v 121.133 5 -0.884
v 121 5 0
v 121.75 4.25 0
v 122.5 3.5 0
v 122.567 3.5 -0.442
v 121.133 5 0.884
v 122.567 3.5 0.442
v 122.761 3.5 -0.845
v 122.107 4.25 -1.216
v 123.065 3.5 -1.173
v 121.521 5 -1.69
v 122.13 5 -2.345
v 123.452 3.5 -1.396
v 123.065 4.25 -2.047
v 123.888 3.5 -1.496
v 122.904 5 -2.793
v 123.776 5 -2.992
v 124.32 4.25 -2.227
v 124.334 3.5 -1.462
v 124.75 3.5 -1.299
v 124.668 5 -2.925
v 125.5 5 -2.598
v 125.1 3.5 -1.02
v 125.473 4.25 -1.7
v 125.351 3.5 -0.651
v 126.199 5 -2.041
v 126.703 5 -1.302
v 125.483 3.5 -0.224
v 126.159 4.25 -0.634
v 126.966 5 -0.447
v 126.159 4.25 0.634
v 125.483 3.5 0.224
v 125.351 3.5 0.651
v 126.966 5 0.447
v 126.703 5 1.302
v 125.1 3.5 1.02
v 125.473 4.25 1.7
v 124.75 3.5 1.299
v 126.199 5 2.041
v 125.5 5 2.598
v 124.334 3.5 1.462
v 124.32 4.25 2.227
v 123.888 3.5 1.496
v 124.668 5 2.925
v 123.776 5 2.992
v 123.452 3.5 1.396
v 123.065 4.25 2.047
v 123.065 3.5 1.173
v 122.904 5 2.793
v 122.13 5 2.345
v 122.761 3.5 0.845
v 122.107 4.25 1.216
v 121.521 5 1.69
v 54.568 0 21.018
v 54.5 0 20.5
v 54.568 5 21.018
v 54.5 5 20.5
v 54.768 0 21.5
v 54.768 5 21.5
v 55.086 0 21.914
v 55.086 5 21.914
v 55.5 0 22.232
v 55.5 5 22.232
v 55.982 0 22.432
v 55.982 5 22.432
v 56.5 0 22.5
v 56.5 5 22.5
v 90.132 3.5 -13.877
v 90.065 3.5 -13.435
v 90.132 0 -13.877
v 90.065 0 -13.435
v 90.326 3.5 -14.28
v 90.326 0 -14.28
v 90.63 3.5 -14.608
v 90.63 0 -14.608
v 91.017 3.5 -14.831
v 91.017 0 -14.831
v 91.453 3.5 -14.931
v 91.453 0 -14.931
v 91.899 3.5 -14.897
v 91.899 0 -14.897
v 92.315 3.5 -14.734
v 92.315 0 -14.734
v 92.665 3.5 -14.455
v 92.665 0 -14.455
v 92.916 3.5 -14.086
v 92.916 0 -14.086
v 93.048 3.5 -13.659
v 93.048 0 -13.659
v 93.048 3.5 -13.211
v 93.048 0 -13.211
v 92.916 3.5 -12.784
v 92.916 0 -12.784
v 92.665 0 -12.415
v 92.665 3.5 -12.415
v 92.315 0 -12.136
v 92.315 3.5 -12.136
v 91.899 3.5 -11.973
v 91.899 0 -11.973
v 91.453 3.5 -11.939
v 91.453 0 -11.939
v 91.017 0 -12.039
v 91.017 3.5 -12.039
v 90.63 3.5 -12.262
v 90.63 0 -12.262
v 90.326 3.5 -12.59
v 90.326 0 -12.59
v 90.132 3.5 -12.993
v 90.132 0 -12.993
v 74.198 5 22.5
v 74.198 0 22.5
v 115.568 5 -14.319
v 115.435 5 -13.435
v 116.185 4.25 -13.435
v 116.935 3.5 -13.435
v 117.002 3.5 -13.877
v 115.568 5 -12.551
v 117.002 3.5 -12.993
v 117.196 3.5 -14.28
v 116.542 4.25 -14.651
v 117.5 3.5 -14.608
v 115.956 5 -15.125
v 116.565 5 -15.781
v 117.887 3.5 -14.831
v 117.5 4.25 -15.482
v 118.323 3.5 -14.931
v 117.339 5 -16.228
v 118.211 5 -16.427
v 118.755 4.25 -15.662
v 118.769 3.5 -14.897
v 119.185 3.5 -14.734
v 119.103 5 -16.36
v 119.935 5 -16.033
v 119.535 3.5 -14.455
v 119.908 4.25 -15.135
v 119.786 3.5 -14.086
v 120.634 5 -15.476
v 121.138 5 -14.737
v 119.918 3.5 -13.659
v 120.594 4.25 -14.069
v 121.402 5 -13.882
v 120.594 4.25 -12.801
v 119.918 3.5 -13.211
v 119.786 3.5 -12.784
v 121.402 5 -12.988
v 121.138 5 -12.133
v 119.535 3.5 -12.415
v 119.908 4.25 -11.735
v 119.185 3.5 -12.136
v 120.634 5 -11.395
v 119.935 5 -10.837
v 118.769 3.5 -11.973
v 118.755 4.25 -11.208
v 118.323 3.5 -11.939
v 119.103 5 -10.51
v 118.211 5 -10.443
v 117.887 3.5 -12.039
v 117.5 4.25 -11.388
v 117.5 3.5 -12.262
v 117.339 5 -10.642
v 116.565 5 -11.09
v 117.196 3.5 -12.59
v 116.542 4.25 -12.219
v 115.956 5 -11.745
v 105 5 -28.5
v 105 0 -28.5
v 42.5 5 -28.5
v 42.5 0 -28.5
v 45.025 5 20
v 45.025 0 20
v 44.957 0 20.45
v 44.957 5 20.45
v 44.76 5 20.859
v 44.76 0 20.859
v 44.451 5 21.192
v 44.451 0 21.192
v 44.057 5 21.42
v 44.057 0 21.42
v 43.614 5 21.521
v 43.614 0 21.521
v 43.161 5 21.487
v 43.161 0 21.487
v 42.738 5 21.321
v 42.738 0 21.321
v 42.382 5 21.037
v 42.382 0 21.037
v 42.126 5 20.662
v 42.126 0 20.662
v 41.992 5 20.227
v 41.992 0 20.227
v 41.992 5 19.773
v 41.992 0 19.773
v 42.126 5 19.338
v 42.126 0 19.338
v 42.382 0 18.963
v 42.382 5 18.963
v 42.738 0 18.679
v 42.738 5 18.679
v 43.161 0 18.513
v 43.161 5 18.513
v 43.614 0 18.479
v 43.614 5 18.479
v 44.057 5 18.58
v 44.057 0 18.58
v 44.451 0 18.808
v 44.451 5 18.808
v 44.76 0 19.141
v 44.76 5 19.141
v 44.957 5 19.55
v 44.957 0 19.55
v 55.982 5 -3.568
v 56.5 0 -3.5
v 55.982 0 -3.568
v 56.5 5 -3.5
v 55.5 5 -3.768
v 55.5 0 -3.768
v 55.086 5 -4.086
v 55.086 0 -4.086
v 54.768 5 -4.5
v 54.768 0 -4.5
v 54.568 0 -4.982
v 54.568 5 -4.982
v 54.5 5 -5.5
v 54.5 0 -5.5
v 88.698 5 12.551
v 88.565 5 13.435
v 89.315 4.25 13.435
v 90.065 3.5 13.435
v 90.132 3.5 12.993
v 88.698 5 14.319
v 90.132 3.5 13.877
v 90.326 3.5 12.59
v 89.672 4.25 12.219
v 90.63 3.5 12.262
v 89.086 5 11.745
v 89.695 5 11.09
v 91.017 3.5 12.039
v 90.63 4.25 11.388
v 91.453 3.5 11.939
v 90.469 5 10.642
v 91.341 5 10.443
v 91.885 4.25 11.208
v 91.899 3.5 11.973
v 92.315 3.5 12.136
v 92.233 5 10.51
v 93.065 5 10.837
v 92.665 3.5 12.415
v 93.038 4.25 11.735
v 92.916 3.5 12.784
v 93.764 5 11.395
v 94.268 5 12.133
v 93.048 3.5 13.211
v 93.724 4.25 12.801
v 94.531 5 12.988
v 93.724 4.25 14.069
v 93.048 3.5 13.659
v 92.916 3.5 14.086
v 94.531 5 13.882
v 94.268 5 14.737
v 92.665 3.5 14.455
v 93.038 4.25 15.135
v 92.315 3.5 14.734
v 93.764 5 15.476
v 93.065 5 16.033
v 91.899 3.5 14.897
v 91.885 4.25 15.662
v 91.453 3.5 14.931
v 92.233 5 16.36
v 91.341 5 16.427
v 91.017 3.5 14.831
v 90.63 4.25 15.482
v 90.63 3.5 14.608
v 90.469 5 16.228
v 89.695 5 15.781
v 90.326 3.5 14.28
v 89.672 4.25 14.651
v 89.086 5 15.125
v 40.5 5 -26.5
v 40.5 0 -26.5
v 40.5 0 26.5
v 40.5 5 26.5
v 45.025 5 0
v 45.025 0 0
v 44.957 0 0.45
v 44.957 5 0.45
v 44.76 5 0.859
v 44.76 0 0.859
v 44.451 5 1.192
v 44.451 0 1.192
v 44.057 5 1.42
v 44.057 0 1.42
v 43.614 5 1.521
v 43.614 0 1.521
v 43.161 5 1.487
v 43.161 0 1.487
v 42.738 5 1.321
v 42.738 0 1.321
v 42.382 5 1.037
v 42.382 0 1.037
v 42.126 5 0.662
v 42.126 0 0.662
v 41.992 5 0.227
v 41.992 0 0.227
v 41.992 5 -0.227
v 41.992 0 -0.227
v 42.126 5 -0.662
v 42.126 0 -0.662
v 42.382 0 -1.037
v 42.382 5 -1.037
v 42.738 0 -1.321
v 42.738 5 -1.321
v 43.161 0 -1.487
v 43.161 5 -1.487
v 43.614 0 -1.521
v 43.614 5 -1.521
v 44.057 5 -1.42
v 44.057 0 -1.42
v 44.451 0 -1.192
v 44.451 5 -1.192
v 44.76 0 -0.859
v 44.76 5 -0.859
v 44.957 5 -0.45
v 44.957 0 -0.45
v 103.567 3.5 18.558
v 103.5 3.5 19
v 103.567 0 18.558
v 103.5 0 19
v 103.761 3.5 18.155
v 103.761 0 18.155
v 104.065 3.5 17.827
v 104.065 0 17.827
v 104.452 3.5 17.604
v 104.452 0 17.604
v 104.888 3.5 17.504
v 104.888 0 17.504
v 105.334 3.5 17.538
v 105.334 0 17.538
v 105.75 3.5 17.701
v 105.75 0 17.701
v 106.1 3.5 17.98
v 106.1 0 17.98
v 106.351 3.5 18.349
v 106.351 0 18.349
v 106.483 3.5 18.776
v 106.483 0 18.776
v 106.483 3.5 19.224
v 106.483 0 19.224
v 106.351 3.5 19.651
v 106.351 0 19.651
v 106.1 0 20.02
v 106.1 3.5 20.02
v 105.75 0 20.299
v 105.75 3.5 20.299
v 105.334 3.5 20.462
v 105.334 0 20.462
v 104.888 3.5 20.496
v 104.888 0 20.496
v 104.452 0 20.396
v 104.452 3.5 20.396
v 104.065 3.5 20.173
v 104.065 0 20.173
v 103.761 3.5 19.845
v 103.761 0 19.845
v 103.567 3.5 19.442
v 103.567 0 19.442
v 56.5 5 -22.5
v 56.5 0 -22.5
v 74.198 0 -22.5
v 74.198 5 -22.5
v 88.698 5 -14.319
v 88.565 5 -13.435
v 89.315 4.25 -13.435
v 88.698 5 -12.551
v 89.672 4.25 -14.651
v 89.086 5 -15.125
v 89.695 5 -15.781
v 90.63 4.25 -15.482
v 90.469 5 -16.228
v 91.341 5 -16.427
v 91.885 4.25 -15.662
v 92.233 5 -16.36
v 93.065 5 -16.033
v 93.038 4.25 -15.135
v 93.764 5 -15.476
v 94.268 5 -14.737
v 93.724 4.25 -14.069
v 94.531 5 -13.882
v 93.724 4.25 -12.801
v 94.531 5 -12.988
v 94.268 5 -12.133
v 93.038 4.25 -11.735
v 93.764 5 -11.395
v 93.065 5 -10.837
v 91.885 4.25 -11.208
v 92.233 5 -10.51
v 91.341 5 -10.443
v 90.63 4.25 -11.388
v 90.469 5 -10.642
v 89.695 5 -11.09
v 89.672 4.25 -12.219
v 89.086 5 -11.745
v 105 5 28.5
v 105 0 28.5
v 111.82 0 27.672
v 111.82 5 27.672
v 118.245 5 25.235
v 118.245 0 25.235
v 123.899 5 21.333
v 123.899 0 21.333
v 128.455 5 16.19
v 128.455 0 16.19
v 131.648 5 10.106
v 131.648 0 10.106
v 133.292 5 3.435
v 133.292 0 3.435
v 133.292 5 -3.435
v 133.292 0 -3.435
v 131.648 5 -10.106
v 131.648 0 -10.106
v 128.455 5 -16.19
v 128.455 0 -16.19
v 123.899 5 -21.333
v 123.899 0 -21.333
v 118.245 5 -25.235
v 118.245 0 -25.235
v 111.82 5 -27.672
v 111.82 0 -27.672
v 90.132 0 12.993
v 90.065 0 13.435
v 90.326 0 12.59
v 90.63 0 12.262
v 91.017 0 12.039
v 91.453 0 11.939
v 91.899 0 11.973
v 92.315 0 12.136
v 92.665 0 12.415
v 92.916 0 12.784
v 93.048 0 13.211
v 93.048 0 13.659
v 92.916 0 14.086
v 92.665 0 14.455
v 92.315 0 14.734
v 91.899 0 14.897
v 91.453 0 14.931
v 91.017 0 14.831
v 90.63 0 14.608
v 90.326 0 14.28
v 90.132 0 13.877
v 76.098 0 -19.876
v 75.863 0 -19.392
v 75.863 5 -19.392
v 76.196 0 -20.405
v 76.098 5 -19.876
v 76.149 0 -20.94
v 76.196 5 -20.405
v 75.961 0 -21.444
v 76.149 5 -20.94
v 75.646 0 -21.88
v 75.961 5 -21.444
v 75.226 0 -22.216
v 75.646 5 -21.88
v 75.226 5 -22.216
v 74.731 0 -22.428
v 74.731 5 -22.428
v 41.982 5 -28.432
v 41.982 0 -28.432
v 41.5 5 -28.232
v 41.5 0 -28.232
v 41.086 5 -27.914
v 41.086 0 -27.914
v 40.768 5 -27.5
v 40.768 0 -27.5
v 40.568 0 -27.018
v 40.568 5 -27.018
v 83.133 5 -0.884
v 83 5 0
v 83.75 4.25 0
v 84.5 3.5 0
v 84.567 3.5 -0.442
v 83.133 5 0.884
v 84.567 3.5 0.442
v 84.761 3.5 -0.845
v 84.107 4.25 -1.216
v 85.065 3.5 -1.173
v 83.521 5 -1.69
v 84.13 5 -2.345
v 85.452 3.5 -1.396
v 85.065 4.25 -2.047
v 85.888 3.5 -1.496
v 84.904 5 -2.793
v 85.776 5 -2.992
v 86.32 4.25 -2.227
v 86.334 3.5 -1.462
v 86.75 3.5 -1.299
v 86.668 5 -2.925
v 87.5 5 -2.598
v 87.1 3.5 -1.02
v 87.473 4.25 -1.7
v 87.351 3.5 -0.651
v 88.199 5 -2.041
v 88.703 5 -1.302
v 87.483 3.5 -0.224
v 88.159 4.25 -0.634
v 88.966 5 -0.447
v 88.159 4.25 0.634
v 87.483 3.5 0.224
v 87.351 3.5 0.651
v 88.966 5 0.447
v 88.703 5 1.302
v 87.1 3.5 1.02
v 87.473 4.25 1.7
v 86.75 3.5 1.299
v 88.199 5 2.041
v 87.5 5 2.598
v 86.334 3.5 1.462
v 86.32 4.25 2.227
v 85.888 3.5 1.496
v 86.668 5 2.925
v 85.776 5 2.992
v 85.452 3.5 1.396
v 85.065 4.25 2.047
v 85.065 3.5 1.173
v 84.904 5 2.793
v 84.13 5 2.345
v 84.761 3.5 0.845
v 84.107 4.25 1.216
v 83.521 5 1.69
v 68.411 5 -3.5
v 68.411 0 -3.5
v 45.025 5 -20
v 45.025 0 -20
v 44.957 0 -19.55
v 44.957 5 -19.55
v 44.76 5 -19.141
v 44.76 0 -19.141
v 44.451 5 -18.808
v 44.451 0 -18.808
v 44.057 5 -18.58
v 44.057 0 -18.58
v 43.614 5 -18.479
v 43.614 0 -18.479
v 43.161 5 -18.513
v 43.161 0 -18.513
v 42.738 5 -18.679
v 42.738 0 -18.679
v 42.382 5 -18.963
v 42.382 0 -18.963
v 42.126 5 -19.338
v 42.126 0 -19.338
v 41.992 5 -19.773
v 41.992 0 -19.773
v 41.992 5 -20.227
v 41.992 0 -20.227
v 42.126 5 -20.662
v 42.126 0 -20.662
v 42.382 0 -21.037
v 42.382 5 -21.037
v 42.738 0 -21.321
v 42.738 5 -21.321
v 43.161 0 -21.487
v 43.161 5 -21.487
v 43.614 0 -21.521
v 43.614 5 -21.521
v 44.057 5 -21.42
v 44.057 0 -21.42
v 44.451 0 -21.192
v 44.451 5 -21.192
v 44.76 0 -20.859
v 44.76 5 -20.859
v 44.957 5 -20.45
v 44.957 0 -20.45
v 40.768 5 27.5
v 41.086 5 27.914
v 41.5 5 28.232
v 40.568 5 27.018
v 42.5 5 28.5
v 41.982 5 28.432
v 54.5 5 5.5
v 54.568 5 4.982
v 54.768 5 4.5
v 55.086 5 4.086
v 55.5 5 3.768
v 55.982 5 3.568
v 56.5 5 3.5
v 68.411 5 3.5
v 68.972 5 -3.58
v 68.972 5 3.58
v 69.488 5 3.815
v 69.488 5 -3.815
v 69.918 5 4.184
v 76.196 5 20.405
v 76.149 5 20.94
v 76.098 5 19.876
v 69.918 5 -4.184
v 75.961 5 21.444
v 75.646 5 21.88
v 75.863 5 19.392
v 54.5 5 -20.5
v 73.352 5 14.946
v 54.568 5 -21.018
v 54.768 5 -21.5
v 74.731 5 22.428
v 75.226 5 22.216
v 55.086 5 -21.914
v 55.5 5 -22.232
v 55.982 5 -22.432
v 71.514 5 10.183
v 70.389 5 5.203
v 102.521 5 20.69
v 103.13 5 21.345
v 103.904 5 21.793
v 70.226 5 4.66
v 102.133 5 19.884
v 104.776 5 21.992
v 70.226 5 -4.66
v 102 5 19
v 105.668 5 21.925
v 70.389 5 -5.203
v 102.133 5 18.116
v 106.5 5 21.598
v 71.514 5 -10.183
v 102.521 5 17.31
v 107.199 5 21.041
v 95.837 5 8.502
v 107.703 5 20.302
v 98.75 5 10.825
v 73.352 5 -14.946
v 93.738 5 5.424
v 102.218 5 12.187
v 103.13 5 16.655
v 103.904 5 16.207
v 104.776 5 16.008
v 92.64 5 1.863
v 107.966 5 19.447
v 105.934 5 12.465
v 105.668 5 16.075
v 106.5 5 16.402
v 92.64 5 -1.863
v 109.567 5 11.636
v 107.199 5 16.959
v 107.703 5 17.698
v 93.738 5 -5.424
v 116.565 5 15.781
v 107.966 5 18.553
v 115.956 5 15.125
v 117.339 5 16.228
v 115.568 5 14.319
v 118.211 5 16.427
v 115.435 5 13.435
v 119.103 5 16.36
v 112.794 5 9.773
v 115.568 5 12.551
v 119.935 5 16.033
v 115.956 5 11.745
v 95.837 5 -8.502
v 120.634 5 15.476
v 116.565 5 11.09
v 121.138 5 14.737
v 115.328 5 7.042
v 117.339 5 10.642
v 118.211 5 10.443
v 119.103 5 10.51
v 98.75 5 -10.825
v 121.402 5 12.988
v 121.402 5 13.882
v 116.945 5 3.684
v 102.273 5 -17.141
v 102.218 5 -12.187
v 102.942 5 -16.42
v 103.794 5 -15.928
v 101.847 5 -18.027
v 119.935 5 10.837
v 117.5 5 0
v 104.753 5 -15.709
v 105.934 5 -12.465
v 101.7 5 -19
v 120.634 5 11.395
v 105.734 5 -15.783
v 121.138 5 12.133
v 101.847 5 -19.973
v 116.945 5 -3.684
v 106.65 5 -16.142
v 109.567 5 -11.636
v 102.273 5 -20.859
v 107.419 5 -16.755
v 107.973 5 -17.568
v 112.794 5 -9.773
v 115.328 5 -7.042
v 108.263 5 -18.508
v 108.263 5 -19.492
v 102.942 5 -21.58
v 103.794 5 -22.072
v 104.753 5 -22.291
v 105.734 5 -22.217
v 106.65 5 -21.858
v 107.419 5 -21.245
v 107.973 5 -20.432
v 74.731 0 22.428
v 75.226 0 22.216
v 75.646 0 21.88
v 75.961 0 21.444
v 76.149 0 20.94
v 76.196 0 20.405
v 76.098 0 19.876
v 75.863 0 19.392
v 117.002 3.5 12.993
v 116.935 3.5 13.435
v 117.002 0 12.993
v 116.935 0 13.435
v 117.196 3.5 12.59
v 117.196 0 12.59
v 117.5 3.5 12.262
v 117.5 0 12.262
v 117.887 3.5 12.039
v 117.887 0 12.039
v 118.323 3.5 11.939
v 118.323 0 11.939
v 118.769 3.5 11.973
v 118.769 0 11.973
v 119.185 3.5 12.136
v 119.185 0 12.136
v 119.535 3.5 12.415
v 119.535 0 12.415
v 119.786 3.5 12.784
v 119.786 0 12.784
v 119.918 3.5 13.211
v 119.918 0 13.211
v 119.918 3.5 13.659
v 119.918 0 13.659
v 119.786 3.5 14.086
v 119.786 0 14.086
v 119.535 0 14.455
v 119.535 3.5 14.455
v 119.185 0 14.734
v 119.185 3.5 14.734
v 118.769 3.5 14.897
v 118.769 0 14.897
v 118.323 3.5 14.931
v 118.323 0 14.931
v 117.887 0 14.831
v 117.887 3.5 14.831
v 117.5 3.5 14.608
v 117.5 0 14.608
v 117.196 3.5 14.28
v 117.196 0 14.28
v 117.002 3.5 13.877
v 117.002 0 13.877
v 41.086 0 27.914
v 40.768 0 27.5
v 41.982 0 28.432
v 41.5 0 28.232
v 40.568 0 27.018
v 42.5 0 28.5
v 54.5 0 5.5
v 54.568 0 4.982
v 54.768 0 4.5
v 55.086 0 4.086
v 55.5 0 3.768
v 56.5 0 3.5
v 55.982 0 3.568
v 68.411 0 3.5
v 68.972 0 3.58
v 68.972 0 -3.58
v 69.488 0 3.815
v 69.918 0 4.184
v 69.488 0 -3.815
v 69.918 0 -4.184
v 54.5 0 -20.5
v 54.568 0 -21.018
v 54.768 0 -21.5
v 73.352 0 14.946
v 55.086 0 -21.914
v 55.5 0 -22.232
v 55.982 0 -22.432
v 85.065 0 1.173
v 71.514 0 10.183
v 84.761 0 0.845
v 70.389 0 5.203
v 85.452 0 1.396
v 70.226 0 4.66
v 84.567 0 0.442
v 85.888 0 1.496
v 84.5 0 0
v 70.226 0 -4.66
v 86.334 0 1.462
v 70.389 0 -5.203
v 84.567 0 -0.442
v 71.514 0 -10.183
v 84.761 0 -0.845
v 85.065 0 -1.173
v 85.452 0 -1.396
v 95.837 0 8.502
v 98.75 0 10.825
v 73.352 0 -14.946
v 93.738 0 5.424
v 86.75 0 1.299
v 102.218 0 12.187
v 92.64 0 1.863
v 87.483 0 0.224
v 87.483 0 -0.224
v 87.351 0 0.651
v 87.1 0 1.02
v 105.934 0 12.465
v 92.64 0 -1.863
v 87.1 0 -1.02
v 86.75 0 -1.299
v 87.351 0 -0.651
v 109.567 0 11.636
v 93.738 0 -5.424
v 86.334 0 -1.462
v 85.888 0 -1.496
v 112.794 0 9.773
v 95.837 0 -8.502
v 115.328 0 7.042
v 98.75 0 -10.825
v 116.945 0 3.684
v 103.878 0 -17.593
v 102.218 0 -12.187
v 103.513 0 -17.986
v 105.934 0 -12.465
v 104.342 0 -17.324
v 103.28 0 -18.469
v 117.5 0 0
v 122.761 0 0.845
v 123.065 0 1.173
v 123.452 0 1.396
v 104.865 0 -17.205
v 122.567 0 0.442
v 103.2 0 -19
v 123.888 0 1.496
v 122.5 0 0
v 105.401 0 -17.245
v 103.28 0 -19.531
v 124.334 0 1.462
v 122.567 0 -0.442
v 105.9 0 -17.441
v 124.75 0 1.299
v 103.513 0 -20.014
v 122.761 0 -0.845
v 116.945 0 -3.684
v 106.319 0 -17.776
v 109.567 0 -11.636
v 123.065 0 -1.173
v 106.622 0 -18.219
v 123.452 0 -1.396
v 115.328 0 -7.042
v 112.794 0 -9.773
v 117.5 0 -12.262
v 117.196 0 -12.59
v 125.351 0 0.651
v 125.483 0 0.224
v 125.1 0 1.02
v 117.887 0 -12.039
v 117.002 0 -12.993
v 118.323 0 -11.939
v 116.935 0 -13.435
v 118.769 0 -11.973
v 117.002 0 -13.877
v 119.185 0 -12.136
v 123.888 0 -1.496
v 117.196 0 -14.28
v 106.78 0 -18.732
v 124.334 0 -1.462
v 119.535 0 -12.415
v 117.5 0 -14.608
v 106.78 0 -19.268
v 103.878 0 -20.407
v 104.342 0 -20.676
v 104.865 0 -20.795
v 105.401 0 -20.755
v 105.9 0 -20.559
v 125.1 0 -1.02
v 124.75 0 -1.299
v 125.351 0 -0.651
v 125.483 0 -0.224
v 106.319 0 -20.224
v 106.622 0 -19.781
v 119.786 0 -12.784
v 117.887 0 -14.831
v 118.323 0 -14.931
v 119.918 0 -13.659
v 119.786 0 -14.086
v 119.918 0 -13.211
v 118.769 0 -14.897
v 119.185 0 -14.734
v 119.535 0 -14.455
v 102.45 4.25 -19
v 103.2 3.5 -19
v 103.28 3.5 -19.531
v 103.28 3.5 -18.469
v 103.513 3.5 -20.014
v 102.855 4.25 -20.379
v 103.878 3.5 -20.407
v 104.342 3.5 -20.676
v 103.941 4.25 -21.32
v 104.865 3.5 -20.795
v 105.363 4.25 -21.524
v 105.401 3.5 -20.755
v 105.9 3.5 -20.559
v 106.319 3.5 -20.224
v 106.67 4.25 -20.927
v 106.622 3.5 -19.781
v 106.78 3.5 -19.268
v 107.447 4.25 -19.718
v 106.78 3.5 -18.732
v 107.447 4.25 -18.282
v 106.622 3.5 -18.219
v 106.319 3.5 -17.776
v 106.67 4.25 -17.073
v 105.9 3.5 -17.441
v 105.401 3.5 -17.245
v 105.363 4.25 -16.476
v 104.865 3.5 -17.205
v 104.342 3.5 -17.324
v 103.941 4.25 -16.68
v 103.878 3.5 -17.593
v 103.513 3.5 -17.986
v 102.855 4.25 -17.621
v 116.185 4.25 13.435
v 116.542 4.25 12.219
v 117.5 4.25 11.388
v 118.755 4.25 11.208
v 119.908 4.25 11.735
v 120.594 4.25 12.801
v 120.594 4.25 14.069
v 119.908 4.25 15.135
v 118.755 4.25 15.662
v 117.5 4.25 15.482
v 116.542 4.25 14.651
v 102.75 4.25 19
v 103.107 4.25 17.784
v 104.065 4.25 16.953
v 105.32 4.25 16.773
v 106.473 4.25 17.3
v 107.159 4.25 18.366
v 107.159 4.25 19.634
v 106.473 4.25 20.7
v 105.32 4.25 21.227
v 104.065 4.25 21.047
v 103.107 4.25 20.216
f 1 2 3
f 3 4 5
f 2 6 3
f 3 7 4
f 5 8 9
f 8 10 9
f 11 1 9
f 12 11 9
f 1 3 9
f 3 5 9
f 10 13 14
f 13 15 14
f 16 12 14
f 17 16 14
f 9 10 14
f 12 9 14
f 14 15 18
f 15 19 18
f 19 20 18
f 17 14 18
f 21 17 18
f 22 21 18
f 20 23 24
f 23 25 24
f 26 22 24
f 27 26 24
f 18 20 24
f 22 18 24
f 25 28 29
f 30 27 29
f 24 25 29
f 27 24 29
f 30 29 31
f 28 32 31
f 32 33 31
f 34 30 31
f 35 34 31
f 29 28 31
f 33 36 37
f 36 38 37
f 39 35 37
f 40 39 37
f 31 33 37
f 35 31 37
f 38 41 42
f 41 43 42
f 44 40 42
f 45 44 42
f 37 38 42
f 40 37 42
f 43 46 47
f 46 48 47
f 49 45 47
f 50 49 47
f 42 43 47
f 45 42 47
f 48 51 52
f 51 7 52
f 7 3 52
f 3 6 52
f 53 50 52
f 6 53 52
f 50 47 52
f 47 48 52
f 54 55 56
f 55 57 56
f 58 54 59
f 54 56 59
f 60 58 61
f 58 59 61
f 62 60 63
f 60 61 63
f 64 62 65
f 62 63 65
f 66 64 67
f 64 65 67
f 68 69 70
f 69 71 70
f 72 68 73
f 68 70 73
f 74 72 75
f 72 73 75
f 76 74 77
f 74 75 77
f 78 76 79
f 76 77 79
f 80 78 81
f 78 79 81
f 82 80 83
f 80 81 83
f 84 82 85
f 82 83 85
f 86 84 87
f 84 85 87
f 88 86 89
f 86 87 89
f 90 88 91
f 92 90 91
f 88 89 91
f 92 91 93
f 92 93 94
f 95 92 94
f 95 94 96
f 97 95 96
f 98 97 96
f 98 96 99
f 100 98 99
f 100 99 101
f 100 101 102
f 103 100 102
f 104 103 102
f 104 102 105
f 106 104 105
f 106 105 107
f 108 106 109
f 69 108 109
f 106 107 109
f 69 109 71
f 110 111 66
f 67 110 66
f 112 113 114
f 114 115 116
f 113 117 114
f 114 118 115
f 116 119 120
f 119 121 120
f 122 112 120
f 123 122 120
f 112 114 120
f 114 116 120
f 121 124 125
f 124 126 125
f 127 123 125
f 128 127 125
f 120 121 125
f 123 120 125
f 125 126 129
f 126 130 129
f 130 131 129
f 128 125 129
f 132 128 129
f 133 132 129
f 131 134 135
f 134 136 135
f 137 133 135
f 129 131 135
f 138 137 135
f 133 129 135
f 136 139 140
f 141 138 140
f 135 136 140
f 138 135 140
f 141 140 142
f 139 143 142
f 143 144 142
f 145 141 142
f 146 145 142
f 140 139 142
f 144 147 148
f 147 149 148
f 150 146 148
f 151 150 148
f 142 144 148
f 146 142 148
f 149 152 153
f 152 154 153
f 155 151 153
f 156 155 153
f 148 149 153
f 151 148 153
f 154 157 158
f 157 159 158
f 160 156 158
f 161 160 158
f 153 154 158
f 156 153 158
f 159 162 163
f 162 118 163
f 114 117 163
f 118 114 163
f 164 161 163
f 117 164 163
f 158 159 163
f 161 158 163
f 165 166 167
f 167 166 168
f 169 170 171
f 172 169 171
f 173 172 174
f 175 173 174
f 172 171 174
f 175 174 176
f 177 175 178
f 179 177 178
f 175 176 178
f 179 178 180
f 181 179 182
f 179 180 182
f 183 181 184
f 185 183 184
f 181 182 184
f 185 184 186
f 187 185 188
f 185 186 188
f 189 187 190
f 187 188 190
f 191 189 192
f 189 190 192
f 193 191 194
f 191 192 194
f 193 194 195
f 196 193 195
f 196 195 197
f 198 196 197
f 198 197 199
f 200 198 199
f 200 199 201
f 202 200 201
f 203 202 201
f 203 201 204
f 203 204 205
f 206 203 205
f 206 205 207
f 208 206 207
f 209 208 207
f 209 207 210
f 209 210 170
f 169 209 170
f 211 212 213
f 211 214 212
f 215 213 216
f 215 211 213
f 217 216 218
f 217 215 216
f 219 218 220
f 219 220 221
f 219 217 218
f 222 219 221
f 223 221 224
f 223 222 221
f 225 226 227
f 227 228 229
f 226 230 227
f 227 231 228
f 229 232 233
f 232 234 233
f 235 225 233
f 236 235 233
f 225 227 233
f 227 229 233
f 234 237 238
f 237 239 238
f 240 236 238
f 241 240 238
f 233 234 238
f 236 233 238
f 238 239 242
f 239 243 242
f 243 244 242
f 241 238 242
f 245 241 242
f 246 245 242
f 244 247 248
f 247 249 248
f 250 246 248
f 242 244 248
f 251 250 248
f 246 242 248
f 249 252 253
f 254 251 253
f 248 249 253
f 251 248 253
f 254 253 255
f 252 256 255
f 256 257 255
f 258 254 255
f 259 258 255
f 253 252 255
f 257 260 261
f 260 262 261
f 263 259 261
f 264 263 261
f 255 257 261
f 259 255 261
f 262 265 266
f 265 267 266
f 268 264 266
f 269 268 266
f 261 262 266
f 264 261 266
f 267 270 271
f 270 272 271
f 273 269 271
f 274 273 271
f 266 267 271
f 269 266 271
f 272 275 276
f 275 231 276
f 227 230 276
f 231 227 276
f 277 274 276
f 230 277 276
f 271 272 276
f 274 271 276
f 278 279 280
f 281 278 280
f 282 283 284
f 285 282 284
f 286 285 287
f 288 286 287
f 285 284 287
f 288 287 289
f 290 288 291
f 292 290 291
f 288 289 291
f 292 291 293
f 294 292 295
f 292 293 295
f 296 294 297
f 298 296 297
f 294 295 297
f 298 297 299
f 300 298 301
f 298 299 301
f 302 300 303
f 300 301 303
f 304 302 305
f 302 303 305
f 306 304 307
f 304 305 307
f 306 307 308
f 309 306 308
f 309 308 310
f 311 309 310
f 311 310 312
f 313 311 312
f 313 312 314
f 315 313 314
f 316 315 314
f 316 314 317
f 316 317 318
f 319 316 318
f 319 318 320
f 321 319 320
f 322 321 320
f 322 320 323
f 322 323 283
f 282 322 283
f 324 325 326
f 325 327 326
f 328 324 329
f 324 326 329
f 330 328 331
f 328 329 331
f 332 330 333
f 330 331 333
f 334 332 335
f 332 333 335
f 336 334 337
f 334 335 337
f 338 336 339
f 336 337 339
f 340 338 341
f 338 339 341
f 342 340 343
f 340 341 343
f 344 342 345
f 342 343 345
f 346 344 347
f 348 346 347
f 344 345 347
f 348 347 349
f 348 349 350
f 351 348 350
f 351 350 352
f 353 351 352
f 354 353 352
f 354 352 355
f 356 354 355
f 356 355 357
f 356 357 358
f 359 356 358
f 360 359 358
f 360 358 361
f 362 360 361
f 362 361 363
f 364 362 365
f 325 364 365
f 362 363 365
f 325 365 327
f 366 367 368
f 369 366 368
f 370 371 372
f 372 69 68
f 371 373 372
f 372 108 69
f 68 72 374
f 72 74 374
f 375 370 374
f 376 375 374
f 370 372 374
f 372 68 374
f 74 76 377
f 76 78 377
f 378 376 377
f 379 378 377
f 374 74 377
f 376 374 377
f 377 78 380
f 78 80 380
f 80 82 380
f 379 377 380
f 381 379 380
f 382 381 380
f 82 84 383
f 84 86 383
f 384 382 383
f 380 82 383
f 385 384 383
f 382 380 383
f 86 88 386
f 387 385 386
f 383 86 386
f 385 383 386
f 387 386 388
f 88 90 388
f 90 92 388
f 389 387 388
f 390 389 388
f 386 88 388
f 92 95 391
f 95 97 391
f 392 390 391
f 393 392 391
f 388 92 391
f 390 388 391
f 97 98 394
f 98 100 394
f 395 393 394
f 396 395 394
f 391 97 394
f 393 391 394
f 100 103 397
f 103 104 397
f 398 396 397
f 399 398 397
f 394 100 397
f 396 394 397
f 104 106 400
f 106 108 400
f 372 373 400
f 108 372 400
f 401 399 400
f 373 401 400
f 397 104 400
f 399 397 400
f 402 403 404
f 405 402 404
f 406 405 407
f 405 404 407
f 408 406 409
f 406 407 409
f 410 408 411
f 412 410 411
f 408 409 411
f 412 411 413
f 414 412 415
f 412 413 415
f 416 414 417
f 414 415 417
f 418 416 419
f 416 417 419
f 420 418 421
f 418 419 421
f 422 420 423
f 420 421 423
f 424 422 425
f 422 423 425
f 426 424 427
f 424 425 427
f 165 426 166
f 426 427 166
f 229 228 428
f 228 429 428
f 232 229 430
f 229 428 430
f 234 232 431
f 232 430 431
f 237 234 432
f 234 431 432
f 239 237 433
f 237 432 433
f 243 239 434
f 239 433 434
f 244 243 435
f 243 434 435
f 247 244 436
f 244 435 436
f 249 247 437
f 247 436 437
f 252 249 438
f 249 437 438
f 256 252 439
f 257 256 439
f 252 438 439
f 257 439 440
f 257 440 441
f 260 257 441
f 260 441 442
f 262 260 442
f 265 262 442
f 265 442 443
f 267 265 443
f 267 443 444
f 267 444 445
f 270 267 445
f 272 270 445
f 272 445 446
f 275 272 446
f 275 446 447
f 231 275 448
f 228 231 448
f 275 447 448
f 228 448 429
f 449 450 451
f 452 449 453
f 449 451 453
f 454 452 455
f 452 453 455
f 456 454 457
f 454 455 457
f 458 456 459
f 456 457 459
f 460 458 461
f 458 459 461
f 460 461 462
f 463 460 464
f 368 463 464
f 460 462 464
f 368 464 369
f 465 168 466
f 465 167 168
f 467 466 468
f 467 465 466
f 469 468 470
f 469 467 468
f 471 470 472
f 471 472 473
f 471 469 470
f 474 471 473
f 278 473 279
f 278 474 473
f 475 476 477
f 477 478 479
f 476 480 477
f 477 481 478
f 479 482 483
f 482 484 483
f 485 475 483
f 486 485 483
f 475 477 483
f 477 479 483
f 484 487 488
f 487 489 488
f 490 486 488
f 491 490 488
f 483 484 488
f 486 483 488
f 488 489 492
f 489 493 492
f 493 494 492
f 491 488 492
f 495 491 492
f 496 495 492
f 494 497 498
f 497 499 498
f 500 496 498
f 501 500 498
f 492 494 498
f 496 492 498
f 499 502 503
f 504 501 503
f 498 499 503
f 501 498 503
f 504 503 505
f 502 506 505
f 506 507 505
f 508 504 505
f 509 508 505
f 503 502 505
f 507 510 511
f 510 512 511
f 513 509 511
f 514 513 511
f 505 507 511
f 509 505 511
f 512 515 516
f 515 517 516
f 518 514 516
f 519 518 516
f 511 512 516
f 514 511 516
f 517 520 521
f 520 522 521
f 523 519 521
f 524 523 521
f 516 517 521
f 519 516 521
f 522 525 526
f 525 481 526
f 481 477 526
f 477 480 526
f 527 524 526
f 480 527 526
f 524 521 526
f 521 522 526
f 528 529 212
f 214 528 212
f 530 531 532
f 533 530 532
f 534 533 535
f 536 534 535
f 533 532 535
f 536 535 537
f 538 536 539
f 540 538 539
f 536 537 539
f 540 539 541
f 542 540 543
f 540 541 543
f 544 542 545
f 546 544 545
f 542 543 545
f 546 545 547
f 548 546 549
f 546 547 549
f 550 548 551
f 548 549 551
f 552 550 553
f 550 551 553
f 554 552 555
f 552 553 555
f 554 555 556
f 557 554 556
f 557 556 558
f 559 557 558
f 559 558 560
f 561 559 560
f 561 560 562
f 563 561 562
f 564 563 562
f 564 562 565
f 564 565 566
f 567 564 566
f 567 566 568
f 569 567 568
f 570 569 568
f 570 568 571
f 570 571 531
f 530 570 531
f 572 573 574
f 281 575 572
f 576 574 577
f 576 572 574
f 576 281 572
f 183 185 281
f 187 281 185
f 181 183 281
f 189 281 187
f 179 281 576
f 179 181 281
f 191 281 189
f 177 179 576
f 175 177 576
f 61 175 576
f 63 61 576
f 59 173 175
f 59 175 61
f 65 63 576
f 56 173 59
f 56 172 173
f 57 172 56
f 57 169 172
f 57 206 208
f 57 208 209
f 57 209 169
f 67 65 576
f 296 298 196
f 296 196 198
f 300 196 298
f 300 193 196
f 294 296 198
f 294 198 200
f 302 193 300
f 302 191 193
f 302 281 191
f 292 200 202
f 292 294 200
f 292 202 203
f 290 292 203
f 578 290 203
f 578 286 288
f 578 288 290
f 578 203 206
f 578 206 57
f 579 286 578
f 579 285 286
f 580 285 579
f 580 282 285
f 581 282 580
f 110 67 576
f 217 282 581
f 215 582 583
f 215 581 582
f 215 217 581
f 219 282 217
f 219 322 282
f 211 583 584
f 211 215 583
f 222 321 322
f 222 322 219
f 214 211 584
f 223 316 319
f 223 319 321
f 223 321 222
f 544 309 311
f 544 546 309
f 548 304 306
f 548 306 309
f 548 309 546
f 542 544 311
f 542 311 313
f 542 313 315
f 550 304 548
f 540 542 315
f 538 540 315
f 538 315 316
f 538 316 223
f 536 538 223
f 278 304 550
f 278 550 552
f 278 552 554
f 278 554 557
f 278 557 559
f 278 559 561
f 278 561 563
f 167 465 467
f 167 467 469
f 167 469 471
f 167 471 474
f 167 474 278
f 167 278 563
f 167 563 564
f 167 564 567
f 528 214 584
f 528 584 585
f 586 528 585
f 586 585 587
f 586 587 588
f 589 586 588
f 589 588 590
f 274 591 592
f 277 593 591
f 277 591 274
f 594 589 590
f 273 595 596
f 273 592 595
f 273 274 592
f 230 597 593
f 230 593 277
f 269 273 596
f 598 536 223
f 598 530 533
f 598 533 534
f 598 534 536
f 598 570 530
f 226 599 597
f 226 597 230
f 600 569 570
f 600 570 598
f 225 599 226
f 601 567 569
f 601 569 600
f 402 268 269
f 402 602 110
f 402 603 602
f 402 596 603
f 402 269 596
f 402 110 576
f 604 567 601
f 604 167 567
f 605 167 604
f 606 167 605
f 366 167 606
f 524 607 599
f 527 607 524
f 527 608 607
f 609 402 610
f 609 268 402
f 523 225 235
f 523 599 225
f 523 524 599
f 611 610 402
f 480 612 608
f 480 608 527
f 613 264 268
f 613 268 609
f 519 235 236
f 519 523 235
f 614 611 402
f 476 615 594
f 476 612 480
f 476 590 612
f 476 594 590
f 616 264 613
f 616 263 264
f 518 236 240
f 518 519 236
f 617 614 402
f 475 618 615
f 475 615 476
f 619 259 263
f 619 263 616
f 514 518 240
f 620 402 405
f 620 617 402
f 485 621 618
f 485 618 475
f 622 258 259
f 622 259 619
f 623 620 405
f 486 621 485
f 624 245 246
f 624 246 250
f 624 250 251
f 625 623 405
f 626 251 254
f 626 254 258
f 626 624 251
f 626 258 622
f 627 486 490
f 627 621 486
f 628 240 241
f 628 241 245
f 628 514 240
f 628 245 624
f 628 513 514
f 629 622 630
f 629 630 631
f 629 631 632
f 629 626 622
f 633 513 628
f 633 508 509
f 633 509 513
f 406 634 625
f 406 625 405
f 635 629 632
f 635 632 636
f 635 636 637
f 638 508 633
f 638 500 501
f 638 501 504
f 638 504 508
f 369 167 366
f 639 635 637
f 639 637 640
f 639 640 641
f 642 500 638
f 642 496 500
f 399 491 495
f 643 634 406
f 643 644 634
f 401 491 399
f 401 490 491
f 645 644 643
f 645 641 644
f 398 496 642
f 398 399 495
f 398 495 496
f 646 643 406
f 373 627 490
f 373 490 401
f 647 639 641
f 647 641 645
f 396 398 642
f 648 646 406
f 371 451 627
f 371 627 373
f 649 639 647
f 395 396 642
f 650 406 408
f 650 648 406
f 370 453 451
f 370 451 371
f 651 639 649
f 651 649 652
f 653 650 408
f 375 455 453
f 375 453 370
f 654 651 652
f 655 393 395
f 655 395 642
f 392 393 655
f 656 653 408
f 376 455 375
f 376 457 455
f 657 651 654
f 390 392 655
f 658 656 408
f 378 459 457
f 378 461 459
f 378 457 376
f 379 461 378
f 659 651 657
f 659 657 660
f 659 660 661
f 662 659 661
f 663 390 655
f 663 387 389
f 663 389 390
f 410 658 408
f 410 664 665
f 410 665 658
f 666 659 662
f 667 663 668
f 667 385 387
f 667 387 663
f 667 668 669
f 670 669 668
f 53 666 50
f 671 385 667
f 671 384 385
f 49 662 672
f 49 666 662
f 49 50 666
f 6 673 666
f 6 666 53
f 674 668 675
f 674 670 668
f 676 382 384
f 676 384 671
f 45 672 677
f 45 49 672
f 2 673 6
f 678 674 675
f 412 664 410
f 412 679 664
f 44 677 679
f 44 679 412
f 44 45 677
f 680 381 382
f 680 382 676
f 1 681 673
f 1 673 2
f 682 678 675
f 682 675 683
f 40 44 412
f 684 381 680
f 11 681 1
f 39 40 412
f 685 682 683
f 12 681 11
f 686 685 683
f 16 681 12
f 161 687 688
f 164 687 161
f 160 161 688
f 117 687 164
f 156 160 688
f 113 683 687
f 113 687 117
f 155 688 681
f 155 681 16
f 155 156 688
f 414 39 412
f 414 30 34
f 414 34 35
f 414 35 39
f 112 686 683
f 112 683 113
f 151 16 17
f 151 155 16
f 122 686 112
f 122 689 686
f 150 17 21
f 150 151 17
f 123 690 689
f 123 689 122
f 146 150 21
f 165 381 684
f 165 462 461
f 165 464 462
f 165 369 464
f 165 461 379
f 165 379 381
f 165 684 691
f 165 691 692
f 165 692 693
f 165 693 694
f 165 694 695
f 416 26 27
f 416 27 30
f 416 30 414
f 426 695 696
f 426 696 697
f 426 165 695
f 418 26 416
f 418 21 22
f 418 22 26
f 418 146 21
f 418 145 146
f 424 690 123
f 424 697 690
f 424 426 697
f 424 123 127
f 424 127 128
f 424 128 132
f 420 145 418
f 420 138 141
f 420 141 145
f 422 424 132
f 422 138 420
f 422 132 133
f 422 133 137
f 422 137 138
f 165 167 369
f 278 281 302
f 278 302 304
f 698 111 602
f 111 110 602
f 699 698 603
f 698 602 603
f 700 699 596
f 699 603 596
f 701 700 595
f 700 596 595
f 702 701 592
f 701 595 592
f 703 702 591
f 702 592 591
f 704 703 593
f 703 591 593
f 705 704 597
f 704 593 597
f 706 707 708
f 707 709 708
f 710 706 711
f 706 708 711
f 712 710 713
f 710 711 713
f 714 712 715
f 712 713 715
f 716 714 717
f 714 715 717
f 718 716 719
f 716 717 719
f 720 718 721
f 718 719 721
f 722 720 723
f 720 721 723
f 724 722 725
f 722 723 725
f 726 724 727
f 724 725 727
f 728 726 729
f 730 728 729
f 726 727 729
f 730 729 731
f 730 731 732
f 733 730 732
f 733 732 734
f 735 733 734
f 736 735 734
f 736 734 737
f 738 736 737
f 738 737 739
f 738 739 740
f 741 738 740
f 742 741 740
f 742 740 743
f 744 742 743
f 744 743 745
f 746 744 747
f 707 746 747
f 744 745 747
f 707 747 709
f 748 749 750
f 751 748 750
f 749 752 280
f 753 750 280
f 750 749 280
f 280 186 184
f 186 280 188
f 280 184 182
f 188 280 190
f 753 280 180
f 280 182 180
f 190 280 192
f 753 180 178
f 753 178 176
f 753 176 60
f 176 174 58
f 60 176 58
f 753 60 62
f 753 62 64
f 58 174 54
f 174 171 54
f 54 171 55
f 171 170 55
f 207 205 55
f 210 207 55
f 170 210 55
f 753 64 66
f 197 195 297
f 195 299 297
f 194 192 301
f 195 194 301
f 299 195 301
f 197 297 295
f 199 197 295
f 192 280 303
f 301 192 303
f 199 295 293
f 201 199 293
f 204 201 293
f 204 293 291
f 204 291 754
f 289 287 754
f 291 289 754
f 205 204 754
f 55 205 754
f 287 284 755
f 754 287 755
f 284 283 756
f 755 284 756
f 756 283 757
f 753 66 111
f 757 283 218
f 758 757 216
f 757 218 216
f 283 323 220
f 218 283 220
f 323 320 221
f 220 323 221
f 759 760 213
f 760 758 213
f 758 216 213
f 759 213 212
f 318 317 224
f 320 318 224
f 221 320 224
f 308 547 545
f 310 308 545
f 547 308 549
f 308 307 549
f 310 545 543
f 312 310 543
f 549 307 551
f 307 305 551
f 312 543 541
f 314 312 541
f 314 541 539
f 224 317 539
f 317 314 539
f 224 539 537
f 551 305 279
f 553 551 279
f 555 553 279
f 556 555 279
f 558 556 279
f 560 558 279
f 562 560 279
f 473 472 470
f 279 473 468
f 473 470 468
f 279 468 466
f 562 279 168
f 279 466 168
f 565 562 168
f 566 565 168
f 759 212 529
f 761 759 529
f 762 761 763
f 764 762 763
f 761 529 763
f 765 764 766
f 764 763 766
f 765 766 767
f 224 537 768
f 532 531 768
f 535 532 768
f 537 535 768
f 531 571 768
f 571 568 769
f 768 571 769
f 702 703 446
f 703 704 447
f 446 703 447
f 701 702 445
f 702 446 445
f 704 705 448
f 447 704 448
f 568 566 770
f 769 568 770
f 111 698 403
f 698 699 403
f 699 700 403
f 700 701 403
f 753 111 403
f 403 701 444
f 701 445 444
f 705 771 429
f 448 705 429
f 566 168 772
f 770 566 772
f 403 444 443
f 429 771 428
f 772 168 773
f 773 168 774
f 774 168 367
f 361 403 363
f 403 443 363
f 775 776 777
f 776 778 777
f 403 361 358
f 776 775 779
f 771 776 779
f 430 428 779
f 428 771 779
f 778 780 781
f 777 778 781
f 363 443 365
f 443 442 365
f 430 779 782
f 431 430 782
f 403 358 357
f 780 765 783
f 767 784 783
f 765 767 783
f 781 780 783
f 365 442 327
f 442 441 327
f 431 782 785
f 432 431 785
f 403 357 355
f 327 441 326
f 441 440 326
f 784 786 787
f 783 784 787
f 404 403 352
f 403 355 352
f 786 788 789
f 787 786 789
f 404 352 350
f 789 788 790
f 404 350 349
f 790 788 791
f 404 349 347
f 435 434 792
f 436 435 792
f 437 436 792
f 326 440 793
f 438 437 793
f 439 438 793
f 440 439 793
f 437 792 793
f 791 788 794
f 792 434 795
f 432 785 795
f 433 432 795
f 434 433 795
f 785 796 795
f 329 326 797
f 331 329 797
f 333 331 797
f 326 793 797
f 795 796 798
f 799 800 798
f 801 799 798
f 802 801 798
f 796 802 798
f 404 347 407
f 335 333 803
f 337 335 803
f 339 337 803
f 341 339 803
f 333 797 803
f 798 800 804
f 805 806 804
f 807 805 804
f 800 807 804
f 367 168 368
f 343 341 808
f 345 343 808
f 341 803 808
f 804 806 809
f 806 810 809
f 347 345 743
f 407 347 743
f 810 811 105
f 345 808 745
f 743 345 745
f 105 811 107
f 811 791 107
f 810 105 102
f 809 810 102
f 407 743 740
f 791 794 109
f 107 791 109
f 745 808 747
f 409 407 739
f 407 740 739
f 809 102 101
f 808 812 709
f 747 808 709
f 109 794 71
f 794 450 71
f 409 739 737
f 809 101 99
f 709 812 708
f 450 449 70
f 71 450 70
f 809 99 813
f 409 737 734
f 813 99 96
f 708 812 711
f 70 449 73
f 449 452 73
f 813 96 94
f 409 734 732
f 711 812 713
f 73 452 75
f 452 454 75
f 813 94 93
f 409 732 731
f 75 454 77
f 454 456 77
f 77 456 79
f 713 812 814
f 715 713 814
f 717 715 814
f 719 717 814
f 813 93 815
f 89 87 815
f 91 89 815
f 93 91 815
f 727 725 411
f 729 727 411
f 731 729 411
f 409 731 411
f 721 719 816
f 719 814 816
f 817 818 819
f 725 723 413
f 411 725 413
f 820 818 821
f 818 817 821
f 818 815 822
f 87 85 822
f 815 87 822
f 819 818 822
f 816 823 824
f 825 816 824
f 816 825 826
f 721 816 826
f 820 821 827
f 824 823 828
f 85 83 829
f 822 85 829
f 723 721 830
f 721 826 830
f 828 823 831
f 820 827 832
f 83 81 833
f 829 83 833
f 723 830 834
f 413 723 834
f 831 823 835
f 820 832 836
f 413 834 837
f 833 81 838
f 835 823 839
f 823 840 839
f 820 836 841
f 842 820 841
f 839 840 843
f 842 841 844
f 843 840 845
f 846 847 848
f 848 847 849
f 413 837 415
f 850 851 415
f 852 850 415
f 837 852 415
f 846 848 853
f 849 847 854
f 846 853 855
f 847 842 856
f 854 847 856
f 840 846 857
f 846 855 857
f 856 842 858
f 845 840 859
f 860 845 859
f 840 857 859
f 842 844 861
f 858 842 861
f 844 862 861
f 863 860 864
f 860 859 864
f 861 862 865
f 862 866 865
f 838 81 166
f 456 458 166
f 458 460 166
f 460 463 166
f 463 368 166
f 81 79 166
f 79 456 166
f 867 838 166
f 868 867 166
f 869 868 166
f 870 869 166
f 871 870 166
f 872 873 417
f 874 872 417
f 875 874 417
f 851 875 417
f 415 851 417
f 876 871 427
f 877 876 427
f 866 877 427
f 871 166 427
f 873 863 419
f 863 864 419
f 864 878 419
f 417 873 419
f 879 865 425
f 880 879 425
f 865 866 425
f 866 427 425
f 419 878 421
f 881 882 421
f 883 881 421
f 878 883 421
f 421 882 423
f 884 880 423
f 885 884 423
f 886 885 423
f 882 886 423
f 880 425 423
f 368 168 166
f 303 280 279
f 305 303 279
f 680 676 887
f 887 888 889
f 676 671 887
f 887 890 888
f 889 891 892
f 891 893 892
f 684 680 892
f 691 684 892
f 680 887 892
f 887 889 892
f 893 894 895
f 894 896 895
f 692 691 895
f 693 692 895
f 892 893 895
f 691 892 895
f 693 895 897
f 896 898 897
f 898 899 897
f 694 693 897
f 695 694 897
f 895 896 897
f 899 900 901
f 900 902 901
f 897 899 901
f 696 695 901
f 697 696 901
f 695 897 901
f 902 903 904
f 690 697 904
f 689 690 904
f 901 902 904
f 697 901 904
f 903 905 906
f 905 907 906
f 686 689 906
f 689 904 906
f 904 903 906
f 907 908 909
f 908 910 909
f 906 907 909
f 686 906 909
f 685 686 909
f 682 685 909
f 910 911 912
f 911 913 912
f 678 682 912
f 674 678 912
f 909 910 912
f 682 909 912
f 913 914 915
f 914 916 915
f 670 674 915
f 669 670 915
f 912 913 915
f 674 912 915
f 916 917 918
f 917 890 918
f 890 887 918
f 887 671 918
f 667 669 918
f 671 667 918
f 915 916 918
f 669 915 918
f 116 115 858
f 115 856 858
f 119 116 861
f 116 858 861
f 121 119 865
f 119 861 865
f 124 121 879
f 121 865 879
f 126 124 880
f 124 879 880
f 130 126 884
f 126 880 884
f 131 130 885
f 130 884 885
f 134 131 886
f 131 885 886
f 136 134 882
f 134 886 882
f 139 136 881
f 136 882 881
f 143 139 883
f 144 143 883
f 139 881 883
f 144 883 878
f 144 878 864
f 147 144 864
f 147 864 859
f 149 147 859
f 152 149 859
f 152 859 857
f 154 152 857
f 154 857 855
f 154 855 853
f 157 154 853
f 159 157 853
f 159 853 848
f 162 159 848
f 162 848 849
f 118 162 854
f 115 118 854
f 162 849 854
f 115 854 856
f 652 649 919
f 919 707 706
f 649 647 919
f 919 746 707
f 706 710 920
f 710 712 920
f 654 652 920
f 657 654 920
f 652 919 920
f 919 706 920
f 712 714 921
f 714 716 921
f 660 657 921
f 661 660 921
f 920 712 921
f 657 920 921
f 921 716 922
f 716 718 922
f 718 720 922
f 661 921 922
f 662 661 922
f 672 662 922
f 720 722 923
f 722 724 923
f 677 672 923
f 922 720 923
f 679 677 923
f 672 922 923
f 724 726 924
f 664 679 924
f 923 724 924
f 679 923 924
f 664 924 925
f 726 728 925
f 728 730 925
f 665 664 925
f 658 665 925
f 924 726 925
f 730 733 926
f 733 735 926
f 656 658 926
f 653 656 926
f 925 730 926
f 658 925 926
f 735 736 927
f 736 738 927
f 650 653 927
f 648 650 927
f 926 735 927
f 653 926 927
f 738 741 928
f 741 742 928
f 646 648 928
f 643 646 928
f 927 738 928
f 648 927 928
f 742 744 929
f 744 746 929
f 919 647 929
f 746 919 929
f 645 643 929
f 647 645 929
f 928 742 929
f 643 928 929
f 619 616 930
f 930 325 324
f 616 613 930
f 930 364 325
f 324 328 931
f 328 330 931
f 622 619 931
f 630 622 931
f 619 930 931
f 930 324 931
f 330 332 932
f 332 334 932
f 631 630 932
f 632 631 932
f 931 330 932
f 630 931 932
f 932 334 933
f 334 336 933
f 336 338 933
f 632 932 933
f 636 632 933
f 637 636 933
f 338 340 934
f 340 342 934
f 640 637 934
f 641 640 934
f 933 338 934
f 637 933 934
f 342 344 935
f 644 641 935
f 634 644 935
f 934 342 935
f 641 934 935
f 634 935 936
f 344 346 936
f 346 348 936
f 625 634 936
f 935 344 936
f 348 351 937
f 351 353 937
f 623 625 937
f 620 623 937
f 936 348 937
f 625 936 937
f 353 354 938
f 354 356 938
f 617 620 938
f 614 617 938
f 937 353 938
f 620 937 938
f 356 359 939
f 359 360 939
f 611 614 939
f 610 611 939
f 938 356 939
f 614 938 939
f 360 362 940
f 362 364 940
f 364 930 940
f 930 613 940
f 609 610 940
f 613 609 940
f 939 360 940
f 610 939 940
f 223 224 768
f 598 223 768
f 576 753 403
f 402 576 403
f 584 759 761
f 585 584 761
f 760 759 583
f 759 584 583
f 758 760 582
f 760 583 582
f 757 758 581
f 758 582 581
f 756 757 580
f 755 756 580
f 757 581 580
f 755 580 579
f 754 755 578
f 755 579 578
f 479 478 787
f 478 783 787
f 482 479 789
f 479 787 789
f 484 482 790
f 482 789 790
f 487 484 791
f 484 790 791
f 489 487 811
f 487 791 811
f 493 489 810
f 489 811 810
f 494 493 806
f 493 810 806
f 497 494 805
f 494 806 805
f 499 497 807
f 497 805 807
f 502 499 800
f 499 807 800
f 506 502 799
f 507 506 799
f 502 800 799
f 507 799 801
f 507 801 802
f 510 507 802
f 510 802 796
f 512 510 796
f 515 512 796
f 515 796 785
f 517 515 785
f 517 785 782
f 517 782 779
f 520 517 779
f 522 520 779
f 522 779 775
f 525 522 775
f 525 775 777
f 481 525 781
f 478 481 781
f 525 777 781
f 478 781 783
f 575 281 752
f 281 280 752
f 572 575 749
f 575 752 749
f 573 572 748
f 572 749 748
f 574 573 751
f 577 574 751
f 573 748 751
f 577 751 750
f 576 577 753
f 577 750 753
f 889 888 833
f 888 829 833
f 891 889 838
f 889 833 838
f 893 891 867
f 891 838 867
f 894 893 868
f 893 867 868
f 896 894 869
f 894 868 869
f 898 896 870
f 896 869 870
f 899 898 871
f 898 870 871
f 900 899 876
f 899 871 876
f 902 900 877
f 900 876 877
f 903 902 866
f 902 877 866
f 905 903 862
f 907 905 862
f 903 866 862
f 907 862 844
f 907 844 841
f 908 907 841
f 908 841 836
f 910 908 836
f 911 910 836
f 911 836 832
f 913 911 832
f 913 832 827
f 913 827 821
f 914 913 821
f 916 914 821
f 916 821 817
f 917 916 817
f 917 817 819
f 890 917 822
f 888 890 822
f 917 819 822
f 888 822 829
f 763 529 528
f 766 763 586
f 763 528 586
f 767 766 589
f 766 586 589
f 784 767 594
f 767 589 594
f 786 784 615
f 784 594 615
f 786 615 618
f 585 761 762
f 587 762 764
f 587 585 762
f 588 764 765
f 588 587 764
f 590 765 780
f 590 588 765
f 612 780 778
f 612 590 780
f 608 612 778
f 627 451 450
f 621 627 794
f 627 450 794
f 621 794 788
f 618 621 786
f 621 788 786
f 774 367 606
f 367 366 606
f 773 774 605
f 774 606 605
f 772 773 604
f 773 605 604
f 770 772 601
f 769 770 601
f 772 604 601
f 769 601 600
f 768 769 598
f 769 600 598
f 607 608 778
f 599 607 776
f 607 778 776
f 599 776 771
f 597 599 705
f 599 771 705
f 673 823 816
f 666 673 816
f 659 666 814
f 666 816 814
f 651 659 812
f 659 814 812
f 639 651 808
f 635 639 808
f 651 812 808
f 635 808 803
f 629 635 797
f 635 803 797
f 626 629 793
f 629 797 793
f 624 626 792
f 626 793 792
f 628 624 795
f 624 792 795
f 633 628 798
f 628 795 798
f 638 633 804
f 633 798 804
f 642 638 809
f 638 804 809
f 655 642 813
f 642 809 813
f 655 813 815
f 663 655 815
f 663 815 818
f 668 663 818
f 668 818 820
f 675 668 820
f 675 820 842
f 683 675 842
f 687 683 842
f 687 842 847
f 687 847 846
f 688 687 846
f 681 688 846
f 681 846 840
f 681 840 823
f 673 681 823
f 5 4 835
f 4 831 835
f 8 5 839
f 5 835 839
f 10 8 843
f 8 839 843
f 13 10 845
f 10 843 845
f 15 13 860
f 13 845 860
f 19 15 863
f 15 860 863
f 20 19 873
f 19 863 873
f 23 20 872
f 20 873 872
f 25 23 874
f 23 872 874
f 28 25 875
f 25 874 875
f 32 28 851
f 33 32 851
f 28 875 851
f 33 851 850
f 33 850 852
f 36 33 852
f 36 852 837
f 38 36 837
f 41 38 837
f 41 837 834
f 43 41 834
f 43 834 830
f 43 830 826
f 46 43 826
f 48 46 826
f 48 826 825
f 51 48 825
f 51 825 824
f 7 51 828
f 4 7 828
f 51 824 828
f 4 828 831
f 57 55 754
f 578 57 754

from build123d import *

# Parameters (mm, degrees)
EXTRUDE_1_DEPTH              = 5
SKETCH_2_R                   = 1.275
CUT_EXTRUDE_1_DEPTH          = 6
SKETCH_5_R                   = 10
CUT_EXTRUDE_3_DEPTH          = 6
SKETCH_6_R                   = 1.525
CUT_EXTRUDE_4_DEPTH          = 6
SKETCH_9_R                   = 12.5
CUT_EXTRUDE_7_DEPTH          = 6
HOLE_WIZARD_M3_1_D           = 3.6
HOLE_WIZARD_M3_1_CSINK_D     = 6.6
HOLE_WIZARD_M3_1_CSINK_ANGLE = 90
HOLE_WIZARD_1_D              = 3
HOLE_WIZARD_1_CSINK_D        = 6
HOLE_WIZARD_1_CSINK_ANGLE    = 90
SKETCH_3_R                   = 2.025
CUT_EXTRUDE_8_DEPTH          = 10
SKETCH_14_R                  = 37
EXTRUDE_2_DEPTH              = 5
SKETCH_15_R                  = 42.5
EXTRUDE_3_DEPTH              = 5
SKETCH_16_R                  = 2.025
CUT_EXTRUDE_9_DEPTH          = 5
CUT_EXTRUDE_10_DEPTH         = 5
PATTERN_CIRCULAR_1_COUNT     = 6
SKETCH_19_R                  = 6
CUT_EXTRUDE_11_DEPTH         = 5
FILLET_1_R                   = 2
SKETCH_21_W                  = 189.416251563
SKETCH_21_H                  = 140.293779685
CUT_EXTRUDE_12_DEPTH         = 6
SKETCH_25_R                  = 1.525
CUT_EXTRUDE_13_DEPTH         = 6
FILLET_2_R                   = 2
CUT_EXTRUDE_14_DEPTH         = 6
FILLET_3_R                   = 2


with BuildPart() as part:
    # 草图1 → 凸台-拉伸1 (new body)
    with BuildSketch(Plane(origin=(0, 0, 0), x_dir=(1, 0, 0), z_dir=(0, 1, 0))):
        with BuildLine():
            Line((105, 28.5), (-81.404449572, 28.5))
            ThreePointArc((-81.404449572, 28.5), (-142, 0), (-81.404449572, -28.5))
            Line((-81.404449572, -28.5), (105, -28.5))
            ThreePointArc((105, -28.5), (133.5, 0), (105, 28.5))
        make_face()
    extrude(amount=EXTRUDE_1_DEPTH)

    # 草图2 → 切除-拉伸1 (cut, through all)
    with BuildSketch(Plane.XZ):
        with Locations((118.435028843, 13.435028843)):
            Circle(SKETCH_2_R)
        with Locations((118.435028843, -13.435028843)):
            Circle(SKETCH_2_R)
        with Locations((91.564971157, -13.435028843)):
            Circle(SKETCH_2_R)
        with Locations((91.564971157, 13.435028843)):
            Circle(SKETCH_2_R)
        with Locations((124, 0)):
            Circle(SKETCH_2_R)
        with Locations((105, -19)):
            Circle(SKETCH_2_R)
        with Locations((86, 0)):
            Circle(SKETCH_2_R)
        with Locations((105, 19)):
            Circle(SKETCH_2_R)
    extrude(amount=-CUT_EXTRUDE_1_DEPTH, mode=Mode.SUBTRACT)

    # 草图5 → 切除-拉伸3 (cut, through all)
    with BuildSketch(Plane(origin=(0, 5, 0), x_dir=(1, 0, 0), z_dir=(0, 1, 0))):
        with Locations((-105, 0)):
            Circle(SKETCH_5_R)
    extrude(amount=-CUT_EXTRUDE_3_DEPTH, mode=Mode.SUBTRACT)

    # 草图6 → 切除-拉伸4 (cut, through all)
    with BuildSketch(Plane(origin=(0, 5, 0), x_dir=(1, 0, 0), z_dir=(0, 1, 0))):
        with Locations((-135, 0)):
            Circle(SKETCH_6_R)
        with Locations((-120, 25.980762114)):
            Circle(SKETCH_6_R)
        with Locations((-90, 25.980762114)):
            Circle(SKETCH_6_R)
        with Locations((-75, 0)):
            Circle(SKETCH_6_R)
        with Locations((-90, -25.980762114)):
            Circle(SKETCH_6_R)
        with Locations((-120, -25.980762114)):
            Circle(SKETCH_6_R)
    extrude(amount=-CUT_EXTRUDE_4_DEPTH, mode=Mode.SUBTRACT)

    # 草图9 → 切除-拉伸7 (cut, through all)
    with BuildSketch(Plane.XZ):
        with Locations((105, 0)):
            Circle(SKETCH_9_R)
    extrude(amount=-CUT_EXTRUDE_7_DEPTH, mode=Mode.SUBTRACT)

    # M3 十字槽沉头木螺钉的锥形沉头孔1 (through all)
    with Locations(Plane(origin=(0, 5, 0), x_dir=(1, 0, 0), z_dir=(0, 1, 0))):
        with Locations((105, 19)):
            CounterSinkHole(HOLE_WIZARD_M3_1_D / 2, HOLE_WIZARD_M3_1_CSINK_D / 2, counter_sink_angle=HOLE_WIZARD_M3_1_CSINK_ANGLE)

    # 孔1 (through all)
    with Locations(Plane(origin=(0, 5, 0), x_dir=(1, 0, 0), z_dir=(0, 1, 0))):
        with Locations((91.564971157, 13.435028843), (86, 0), (91.564971157, -13.435028843), (105, -19), (118.435028843, -13.435028843), (124, 0), (118.435028843, 13.435028843)):
            CounterSinkHole(HOLE_WIZARD_1_D / 2, HOLE_WIZARD_1_CSINK_D / 2, counter_sink_angle=HOLE_WIZARD_1_CSINK_ANGLE)

    # 草图3 → 切除-拉伸8 (cut)
    with BuildSketch(Plane(origin=(0, 5, 0), x_dir=(1, 0, 0), z_dir=(0, 1, 0))):
        with Locations((-105, 17.25)):
            Circle(SKETCH_3_R)
        with Locations((-90.061061785, 8.625)):
            Circle(SKETCH_3_R)
        with Locations((-90.061061785, -8.625)):
            Circle(SKETCH_3_R)
        with Locations((-105, -17.25)):
            Circle(SKETCH_3_R)
        with Locations((-119.938938215, -8.625)):
            Circle(SKETCH_3_R)
        with Locations((-119.938938215, 8.625)):
            Circle(SKETCH_3_R)
    extrude(amount=-CUT_EXTRUDE_8_DEPTH, mode=Mode.SUBTRACT)

    # 草图14 → 凸台-拉伸2 (add)
    with BuildSketch(Plane(origin=(0, 5, 0), x_dir=(1, 0, 0), z_dir=(0, 1, 0))):
        with Locations((-105, 0)):
            Circle(SKETCH_14_R)
    extrude(amount=-EXTRUDE_2_DEPTH)

    # 草图15 → 凸台-拉伸3 (add)
    with BuildSketch(Plane(origin=(0, 5, 0), x_dir=(1, 0, 0), z_dir=(0, 1, 0))):
        with Locations((-105, 0)):
            Circle(SKETCH_15_R)
    extrude(amount=-EXTRUDE_3_DEPTH)

    # 草图16 → 切除-拉伸9 (cut)
    with BuildSketch(Plane.XZ):
        with Locations((-105, 26.25)):
            Circle(SKETCH_16_R)
        with Locations((-86.438446994, 18.561553006)):
            Circle(SKETCH_16_R)
        with Locations((-78.75, 0)):
            Circle(SKETCH_16_R)
        with Locations((-86.438446994, -18.561553006)):
            Circle(SKETCH_16_R)
        with Locations((-105, -26.25)):
            Circle(SKETCH_16_R)
        with Locations((-123.561553006, -18.561553006)):
            Circle(SKETCH_16_R)
        with Locations((-131.25, 0)):
            Circle(SKETCH_16_R)
        with Locations((-123.561553006, 18.561553006)):
            Circle(SKETCH_16_R)
    extrude(amount=-CUT_EXTRUDE_9_DEPTH, mode=Mode.SUBTRACT)

    # 草图18 → 切除-拉伸10 (cut)
    with BuildSketch(Plane(origin=(0, 5, 0), x_dir=(1, 0, 0), z_dir=(0, 1, 0))):
        with BuildLine():
            Line((-98.815341562, 17.25), (-101.45814062, 12.173230244))
            ThreePointArc((-101.45814062, 12.173230244), (-105, 13), (-108.54185938, 12.173230244))
            Line((-108.54185938, 12.173230244), (-111.184658438, 17.25))
            ThreePointArc((-111.184658438, 17.25), (-105, 21.75), (-98.815341562, 17.25))
        make_face()
    cut_extrude_10 = extrude(amount=-CUT_EXTRUDE_10_DEPTH, mode=Mode.SUBTRACT)

    # 阵列(圆周)1: 切除-拉伸10 ×6 about axis
    pattern_circular_1_axis = Axis((-105, 0, 0), (0, 1, 0))
    for i in range(1, PATTERN_CIRCULAR_1_COUNT):
        add(cut_extrude_10.rotate(pattern_circular_1_axis, i * 360 / PATTERN_CIRCULAR_1_COUNT), mode=Mode.SUBTRACT)

    # 草图19 → 切除-拉伸11 (cut)
    with BuildSketch(Plane.XZ):
        with Locations((-105, 0)):
            Circle(SKETCH_19_R)
    extrude(amount=-CUT_EXTRUDE_11_DEPTH, mode=Mode.SUBTRACT)

    # 圆角1
    fillet_1_edges = [part.edges().sort_by_distance(p)[0] for p in [
        (-73.472234459, 2.5, 28.5),
        (-73.472234459, 2.5, -28.5),
    ]]
    fillet(fillet_1_edges, radius=FILLET_1_R)

    # 草图21 → 切除-拉伸12 (cut, through all)
    with BuildSketch(Plane.XZ):
        with Locations((-54.208125782, -1.277184269)):
            Rectangle(SKETCH_21_W, SKETCH_21_H)
    extrude(amount=-CUT_EXTRUDE_12_DEPTH, mode=Mode.SUBTRACT)

    # 草图25 → 切除-拉伸13 (cut, through all)
    with BuildSketch(Plane.XZ):
        with Locations((43.5, 0)):
            Circle(SKETCH_25_R)
        with Locations((43.5, 20)):
            Circle(SKETCH_25_R)
        with Locations((43.5, -20)):
            Circle(SKETCH_25_R)
    extrude(amount=-CUT_EXTRUDE_13_DEPTH, mode=Mode.SUBTRACT)

    # 圆角2
    fillet_2_edges = [part.edges().sort_by_distance(p)[0] for p in [
        (40.5, 2.5, -28.5),
        (40.5, 2.5, 28.5),
    ]]
    fillet(fillet_2_edges, radius=FILLET_2_R)

    # 草图28 → 切除-拉伸14 (cut, through all)
    with BuildSketch(Plane.XZ):
        with BuildLine():
            ThreePointArc((70.175439701, 3.5), (72.751903077, 13.603684973), (78.190486763, 22.5))
            Line((78.190486763, 22.5), (54.5, 22.5))
            Line((54.5, 22.5), (54.5, 3.5))
            Line((54.5, 3.5), (70.175439701, 3.5))
        make_face()
        with BuildLine():
            Line((54.5, -3.5), (54.5, -22.5))
            Line((54.5, -22.5), (78.190486763, -22.5))
            ThreePointArc((78.190486763, -22.5), (72.751903077, -13.603684973), (70.175439701, -3.5))
            Line((70.175439701, -3.5), (54.5, -3.5))
        make_face()
    extrude(amount=-CUT_EXTRUDE_14_DEPTH, mode=Mode.SUBTRACT)

    # 圆角3
    fillet_3_edges = [part.edges().sort_by_distance(p)[0] for p in [
        (78.190486763, 2.5, 22.5),
        (70.175439701, 2.5, 3.5),
        (54.5, 2.5, 3.5),
        (54.5, 2.5, 22.5),
        (70.175439701, 2.5, -3.5),
        (78.190486763, 2.5, -22.5),
        (54.5, 2.5, -22.5),
        (54.5, 2.5, -3.5),
    ]]
    fillet(fillet_3_edges, radius=FILLET_3_R)


solid = part.part
